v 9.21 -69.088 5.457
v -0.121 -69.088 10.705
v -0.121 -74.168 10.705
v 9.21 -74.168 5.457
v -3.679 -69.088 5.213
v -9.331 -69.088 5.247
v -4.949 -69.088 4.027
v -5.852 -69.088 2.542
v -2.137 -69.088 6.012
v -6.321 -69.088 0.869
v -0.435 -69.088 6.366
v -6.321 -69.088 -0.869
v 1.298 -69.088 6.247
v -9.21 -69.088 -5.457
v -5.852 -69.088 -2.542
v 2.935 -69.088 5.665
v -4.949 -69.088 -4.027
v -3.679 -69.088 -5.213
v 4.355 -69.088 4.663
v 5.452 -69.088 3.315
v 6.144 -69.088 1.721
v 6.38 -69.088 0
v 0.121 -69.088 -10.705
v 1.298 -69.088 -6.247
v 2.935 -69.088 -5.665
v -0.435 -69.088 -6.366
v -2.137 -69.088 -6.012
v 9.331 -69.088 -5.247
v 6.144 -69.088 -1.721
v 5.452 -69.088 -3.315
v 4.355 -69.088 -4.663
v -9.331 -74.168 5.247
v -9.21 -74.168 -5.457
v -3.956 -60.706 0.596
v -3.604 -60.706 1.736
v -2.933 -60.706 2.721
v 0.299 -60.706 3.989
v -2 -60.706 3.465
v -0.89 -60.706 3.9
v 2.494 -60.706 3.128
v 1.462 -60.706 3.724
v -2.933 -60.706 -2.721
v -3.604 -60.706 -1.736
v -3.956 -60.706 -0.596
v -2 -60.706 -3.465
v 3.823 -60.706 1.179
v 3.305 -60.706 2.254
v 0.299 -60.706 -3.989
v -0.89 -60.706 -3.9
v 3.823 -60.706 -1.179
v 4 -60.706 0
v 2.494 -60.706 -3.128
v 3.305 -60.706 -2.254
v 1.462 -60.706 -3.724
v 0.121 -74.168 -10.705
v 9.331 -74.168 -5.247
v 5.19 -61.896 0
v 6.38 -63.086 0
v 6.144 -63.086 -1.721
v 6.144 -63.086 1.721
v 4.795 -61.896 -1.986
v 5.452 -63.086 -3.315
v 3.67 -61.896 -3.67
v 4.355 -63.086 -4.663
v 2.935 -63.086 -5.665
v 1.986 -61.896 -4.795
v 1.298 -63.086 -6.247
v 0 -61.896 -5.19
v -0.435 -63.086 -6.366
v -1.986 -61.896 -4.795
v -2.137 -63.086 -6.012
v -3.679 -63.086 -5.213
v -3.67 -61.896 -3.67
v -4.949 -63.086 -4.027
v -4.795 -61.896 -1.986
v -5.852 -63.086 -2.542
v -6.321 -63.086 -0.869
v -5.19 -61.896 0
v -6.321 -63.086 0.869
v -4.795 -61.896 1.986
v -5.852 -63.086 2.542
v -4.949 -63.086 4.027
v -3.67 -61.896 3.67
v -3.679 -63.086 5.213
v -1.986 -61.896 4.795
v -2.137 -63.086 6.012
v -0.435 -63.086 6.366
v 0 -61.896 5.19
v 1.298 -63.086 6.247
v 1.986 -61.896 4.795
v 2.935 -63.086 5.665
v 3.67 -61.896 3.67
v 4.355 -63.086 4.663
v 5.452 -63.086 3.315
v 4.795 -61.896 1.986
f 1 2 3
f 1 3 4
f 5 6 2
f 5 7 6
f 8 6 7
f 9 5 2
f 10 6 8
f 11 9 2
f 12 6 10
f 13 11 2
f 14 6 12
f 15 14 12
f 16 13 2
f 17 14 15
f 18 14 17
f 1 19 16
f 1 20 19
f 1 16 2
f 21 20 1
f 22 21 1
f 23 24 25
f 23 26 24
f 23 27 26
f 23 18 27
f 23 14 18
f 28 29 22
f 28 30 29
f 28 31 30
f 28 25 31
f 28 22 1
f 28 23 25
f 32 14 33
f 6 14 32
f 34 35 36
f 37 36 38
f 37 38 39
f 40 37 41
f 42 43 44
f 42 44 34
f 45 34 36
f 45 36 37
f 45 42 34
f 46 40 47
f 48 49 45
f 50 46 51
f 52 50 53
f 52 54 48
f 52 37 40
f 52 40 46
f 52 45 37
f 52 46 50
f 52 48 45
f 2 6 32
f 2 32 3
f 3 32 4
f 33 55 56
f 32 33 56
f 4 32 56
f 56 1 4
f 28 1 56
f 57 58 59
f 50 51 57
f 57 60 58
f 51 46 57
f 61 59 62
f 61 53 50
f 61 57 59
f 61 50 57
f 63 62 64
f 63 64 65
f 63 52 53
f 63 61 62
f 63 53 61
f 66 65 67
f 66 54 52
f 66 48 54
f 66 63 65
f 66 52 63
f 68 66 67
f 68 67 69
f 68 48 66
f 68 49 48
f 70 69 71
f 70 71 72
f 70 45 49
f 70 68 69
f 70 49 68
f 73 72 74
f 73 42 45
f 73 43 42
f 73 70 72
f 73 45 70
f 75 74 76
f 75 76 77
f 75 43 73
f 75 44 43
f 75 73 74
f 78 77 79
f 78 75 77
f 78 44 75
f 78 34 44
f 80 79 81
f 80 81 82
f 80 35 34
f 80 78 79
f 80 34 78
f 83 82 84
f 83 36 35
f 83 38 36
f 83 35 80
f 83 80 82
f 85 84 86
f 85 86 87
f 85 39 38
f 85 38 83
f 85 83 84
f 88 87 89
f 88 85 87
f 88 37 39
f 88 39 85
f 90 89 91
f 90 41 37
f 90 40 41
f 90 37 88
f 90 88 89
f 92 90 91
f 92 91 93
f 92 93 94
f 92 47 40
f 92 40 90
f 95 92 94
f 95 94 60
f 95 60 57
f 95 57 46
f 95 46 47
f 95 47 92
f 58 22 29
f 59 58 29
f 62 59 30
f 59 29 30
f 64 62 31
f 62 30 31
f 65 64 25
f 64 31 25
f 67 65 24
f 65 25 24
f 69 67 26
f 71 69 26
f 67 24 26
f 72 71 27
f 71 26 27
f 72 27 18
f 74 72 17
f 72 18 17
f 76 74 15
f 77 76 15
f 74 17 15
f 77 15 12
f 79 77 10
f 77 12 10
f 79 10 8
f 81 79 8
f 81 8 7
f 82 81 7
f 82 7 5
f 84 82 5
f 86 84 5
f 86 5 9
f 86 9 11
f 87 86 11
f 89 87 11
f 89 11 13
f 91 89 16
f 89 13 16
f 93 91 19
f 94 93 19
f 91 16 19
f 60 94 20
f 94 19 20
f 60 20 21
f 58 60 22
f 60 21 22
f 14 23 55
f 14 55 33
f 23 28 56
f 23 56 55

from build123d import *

# Parameters (mm, degrees)
SKETCH1_R           = 6.38048
BOSS_EXTRUDE1_DEPTH = 8.382
BOSS_EXTRUDE2_DEPTH = 5.08
CHAMFER1_SIZE       = 2.380000066


with BuildPart() as part:
    # Sketch1 → Boss-Extrude1 (new body)
    with BuildSketch(Plane(origin=(0, -69.088, -69.088), x_dir=(1, 0, 0), z_dir=(0, 1, 0))):
        with Locations((0, -69.088)):
            Circle(SKETCH1_R)
    extrude(amount=BOSS_EXTRUDE1_DEPTH)

    # Sketch1<11> → Boss-Extrude2 (add)
    with BuildSketch(Plane(origin=(0, -69.088, -69.088), x_dir=(1, 0, 0), z_dir=(0, 1, 0))):
        Polygon((9.209764962, -74.545302509), (9.33104509, -63.840760835), (0.121280128, -58.383458325), (-9.209764962, -63.630697491), (-9.33104509, -74.335239165), (-0.121280128, -79.792541675), align=None)
    extrude(amount=-BOSS_EXTRUDE2_DEPTH)

    # Chamfer1
    chamfer1_edges = [part.edges().sort_by_distance(p)[0] for p in [
        (-6.38048, -60.706, 0),
    ]]
    chamfer(chamfer1_edges, length=CHAMFER1_SIZE)


solid = part.part
